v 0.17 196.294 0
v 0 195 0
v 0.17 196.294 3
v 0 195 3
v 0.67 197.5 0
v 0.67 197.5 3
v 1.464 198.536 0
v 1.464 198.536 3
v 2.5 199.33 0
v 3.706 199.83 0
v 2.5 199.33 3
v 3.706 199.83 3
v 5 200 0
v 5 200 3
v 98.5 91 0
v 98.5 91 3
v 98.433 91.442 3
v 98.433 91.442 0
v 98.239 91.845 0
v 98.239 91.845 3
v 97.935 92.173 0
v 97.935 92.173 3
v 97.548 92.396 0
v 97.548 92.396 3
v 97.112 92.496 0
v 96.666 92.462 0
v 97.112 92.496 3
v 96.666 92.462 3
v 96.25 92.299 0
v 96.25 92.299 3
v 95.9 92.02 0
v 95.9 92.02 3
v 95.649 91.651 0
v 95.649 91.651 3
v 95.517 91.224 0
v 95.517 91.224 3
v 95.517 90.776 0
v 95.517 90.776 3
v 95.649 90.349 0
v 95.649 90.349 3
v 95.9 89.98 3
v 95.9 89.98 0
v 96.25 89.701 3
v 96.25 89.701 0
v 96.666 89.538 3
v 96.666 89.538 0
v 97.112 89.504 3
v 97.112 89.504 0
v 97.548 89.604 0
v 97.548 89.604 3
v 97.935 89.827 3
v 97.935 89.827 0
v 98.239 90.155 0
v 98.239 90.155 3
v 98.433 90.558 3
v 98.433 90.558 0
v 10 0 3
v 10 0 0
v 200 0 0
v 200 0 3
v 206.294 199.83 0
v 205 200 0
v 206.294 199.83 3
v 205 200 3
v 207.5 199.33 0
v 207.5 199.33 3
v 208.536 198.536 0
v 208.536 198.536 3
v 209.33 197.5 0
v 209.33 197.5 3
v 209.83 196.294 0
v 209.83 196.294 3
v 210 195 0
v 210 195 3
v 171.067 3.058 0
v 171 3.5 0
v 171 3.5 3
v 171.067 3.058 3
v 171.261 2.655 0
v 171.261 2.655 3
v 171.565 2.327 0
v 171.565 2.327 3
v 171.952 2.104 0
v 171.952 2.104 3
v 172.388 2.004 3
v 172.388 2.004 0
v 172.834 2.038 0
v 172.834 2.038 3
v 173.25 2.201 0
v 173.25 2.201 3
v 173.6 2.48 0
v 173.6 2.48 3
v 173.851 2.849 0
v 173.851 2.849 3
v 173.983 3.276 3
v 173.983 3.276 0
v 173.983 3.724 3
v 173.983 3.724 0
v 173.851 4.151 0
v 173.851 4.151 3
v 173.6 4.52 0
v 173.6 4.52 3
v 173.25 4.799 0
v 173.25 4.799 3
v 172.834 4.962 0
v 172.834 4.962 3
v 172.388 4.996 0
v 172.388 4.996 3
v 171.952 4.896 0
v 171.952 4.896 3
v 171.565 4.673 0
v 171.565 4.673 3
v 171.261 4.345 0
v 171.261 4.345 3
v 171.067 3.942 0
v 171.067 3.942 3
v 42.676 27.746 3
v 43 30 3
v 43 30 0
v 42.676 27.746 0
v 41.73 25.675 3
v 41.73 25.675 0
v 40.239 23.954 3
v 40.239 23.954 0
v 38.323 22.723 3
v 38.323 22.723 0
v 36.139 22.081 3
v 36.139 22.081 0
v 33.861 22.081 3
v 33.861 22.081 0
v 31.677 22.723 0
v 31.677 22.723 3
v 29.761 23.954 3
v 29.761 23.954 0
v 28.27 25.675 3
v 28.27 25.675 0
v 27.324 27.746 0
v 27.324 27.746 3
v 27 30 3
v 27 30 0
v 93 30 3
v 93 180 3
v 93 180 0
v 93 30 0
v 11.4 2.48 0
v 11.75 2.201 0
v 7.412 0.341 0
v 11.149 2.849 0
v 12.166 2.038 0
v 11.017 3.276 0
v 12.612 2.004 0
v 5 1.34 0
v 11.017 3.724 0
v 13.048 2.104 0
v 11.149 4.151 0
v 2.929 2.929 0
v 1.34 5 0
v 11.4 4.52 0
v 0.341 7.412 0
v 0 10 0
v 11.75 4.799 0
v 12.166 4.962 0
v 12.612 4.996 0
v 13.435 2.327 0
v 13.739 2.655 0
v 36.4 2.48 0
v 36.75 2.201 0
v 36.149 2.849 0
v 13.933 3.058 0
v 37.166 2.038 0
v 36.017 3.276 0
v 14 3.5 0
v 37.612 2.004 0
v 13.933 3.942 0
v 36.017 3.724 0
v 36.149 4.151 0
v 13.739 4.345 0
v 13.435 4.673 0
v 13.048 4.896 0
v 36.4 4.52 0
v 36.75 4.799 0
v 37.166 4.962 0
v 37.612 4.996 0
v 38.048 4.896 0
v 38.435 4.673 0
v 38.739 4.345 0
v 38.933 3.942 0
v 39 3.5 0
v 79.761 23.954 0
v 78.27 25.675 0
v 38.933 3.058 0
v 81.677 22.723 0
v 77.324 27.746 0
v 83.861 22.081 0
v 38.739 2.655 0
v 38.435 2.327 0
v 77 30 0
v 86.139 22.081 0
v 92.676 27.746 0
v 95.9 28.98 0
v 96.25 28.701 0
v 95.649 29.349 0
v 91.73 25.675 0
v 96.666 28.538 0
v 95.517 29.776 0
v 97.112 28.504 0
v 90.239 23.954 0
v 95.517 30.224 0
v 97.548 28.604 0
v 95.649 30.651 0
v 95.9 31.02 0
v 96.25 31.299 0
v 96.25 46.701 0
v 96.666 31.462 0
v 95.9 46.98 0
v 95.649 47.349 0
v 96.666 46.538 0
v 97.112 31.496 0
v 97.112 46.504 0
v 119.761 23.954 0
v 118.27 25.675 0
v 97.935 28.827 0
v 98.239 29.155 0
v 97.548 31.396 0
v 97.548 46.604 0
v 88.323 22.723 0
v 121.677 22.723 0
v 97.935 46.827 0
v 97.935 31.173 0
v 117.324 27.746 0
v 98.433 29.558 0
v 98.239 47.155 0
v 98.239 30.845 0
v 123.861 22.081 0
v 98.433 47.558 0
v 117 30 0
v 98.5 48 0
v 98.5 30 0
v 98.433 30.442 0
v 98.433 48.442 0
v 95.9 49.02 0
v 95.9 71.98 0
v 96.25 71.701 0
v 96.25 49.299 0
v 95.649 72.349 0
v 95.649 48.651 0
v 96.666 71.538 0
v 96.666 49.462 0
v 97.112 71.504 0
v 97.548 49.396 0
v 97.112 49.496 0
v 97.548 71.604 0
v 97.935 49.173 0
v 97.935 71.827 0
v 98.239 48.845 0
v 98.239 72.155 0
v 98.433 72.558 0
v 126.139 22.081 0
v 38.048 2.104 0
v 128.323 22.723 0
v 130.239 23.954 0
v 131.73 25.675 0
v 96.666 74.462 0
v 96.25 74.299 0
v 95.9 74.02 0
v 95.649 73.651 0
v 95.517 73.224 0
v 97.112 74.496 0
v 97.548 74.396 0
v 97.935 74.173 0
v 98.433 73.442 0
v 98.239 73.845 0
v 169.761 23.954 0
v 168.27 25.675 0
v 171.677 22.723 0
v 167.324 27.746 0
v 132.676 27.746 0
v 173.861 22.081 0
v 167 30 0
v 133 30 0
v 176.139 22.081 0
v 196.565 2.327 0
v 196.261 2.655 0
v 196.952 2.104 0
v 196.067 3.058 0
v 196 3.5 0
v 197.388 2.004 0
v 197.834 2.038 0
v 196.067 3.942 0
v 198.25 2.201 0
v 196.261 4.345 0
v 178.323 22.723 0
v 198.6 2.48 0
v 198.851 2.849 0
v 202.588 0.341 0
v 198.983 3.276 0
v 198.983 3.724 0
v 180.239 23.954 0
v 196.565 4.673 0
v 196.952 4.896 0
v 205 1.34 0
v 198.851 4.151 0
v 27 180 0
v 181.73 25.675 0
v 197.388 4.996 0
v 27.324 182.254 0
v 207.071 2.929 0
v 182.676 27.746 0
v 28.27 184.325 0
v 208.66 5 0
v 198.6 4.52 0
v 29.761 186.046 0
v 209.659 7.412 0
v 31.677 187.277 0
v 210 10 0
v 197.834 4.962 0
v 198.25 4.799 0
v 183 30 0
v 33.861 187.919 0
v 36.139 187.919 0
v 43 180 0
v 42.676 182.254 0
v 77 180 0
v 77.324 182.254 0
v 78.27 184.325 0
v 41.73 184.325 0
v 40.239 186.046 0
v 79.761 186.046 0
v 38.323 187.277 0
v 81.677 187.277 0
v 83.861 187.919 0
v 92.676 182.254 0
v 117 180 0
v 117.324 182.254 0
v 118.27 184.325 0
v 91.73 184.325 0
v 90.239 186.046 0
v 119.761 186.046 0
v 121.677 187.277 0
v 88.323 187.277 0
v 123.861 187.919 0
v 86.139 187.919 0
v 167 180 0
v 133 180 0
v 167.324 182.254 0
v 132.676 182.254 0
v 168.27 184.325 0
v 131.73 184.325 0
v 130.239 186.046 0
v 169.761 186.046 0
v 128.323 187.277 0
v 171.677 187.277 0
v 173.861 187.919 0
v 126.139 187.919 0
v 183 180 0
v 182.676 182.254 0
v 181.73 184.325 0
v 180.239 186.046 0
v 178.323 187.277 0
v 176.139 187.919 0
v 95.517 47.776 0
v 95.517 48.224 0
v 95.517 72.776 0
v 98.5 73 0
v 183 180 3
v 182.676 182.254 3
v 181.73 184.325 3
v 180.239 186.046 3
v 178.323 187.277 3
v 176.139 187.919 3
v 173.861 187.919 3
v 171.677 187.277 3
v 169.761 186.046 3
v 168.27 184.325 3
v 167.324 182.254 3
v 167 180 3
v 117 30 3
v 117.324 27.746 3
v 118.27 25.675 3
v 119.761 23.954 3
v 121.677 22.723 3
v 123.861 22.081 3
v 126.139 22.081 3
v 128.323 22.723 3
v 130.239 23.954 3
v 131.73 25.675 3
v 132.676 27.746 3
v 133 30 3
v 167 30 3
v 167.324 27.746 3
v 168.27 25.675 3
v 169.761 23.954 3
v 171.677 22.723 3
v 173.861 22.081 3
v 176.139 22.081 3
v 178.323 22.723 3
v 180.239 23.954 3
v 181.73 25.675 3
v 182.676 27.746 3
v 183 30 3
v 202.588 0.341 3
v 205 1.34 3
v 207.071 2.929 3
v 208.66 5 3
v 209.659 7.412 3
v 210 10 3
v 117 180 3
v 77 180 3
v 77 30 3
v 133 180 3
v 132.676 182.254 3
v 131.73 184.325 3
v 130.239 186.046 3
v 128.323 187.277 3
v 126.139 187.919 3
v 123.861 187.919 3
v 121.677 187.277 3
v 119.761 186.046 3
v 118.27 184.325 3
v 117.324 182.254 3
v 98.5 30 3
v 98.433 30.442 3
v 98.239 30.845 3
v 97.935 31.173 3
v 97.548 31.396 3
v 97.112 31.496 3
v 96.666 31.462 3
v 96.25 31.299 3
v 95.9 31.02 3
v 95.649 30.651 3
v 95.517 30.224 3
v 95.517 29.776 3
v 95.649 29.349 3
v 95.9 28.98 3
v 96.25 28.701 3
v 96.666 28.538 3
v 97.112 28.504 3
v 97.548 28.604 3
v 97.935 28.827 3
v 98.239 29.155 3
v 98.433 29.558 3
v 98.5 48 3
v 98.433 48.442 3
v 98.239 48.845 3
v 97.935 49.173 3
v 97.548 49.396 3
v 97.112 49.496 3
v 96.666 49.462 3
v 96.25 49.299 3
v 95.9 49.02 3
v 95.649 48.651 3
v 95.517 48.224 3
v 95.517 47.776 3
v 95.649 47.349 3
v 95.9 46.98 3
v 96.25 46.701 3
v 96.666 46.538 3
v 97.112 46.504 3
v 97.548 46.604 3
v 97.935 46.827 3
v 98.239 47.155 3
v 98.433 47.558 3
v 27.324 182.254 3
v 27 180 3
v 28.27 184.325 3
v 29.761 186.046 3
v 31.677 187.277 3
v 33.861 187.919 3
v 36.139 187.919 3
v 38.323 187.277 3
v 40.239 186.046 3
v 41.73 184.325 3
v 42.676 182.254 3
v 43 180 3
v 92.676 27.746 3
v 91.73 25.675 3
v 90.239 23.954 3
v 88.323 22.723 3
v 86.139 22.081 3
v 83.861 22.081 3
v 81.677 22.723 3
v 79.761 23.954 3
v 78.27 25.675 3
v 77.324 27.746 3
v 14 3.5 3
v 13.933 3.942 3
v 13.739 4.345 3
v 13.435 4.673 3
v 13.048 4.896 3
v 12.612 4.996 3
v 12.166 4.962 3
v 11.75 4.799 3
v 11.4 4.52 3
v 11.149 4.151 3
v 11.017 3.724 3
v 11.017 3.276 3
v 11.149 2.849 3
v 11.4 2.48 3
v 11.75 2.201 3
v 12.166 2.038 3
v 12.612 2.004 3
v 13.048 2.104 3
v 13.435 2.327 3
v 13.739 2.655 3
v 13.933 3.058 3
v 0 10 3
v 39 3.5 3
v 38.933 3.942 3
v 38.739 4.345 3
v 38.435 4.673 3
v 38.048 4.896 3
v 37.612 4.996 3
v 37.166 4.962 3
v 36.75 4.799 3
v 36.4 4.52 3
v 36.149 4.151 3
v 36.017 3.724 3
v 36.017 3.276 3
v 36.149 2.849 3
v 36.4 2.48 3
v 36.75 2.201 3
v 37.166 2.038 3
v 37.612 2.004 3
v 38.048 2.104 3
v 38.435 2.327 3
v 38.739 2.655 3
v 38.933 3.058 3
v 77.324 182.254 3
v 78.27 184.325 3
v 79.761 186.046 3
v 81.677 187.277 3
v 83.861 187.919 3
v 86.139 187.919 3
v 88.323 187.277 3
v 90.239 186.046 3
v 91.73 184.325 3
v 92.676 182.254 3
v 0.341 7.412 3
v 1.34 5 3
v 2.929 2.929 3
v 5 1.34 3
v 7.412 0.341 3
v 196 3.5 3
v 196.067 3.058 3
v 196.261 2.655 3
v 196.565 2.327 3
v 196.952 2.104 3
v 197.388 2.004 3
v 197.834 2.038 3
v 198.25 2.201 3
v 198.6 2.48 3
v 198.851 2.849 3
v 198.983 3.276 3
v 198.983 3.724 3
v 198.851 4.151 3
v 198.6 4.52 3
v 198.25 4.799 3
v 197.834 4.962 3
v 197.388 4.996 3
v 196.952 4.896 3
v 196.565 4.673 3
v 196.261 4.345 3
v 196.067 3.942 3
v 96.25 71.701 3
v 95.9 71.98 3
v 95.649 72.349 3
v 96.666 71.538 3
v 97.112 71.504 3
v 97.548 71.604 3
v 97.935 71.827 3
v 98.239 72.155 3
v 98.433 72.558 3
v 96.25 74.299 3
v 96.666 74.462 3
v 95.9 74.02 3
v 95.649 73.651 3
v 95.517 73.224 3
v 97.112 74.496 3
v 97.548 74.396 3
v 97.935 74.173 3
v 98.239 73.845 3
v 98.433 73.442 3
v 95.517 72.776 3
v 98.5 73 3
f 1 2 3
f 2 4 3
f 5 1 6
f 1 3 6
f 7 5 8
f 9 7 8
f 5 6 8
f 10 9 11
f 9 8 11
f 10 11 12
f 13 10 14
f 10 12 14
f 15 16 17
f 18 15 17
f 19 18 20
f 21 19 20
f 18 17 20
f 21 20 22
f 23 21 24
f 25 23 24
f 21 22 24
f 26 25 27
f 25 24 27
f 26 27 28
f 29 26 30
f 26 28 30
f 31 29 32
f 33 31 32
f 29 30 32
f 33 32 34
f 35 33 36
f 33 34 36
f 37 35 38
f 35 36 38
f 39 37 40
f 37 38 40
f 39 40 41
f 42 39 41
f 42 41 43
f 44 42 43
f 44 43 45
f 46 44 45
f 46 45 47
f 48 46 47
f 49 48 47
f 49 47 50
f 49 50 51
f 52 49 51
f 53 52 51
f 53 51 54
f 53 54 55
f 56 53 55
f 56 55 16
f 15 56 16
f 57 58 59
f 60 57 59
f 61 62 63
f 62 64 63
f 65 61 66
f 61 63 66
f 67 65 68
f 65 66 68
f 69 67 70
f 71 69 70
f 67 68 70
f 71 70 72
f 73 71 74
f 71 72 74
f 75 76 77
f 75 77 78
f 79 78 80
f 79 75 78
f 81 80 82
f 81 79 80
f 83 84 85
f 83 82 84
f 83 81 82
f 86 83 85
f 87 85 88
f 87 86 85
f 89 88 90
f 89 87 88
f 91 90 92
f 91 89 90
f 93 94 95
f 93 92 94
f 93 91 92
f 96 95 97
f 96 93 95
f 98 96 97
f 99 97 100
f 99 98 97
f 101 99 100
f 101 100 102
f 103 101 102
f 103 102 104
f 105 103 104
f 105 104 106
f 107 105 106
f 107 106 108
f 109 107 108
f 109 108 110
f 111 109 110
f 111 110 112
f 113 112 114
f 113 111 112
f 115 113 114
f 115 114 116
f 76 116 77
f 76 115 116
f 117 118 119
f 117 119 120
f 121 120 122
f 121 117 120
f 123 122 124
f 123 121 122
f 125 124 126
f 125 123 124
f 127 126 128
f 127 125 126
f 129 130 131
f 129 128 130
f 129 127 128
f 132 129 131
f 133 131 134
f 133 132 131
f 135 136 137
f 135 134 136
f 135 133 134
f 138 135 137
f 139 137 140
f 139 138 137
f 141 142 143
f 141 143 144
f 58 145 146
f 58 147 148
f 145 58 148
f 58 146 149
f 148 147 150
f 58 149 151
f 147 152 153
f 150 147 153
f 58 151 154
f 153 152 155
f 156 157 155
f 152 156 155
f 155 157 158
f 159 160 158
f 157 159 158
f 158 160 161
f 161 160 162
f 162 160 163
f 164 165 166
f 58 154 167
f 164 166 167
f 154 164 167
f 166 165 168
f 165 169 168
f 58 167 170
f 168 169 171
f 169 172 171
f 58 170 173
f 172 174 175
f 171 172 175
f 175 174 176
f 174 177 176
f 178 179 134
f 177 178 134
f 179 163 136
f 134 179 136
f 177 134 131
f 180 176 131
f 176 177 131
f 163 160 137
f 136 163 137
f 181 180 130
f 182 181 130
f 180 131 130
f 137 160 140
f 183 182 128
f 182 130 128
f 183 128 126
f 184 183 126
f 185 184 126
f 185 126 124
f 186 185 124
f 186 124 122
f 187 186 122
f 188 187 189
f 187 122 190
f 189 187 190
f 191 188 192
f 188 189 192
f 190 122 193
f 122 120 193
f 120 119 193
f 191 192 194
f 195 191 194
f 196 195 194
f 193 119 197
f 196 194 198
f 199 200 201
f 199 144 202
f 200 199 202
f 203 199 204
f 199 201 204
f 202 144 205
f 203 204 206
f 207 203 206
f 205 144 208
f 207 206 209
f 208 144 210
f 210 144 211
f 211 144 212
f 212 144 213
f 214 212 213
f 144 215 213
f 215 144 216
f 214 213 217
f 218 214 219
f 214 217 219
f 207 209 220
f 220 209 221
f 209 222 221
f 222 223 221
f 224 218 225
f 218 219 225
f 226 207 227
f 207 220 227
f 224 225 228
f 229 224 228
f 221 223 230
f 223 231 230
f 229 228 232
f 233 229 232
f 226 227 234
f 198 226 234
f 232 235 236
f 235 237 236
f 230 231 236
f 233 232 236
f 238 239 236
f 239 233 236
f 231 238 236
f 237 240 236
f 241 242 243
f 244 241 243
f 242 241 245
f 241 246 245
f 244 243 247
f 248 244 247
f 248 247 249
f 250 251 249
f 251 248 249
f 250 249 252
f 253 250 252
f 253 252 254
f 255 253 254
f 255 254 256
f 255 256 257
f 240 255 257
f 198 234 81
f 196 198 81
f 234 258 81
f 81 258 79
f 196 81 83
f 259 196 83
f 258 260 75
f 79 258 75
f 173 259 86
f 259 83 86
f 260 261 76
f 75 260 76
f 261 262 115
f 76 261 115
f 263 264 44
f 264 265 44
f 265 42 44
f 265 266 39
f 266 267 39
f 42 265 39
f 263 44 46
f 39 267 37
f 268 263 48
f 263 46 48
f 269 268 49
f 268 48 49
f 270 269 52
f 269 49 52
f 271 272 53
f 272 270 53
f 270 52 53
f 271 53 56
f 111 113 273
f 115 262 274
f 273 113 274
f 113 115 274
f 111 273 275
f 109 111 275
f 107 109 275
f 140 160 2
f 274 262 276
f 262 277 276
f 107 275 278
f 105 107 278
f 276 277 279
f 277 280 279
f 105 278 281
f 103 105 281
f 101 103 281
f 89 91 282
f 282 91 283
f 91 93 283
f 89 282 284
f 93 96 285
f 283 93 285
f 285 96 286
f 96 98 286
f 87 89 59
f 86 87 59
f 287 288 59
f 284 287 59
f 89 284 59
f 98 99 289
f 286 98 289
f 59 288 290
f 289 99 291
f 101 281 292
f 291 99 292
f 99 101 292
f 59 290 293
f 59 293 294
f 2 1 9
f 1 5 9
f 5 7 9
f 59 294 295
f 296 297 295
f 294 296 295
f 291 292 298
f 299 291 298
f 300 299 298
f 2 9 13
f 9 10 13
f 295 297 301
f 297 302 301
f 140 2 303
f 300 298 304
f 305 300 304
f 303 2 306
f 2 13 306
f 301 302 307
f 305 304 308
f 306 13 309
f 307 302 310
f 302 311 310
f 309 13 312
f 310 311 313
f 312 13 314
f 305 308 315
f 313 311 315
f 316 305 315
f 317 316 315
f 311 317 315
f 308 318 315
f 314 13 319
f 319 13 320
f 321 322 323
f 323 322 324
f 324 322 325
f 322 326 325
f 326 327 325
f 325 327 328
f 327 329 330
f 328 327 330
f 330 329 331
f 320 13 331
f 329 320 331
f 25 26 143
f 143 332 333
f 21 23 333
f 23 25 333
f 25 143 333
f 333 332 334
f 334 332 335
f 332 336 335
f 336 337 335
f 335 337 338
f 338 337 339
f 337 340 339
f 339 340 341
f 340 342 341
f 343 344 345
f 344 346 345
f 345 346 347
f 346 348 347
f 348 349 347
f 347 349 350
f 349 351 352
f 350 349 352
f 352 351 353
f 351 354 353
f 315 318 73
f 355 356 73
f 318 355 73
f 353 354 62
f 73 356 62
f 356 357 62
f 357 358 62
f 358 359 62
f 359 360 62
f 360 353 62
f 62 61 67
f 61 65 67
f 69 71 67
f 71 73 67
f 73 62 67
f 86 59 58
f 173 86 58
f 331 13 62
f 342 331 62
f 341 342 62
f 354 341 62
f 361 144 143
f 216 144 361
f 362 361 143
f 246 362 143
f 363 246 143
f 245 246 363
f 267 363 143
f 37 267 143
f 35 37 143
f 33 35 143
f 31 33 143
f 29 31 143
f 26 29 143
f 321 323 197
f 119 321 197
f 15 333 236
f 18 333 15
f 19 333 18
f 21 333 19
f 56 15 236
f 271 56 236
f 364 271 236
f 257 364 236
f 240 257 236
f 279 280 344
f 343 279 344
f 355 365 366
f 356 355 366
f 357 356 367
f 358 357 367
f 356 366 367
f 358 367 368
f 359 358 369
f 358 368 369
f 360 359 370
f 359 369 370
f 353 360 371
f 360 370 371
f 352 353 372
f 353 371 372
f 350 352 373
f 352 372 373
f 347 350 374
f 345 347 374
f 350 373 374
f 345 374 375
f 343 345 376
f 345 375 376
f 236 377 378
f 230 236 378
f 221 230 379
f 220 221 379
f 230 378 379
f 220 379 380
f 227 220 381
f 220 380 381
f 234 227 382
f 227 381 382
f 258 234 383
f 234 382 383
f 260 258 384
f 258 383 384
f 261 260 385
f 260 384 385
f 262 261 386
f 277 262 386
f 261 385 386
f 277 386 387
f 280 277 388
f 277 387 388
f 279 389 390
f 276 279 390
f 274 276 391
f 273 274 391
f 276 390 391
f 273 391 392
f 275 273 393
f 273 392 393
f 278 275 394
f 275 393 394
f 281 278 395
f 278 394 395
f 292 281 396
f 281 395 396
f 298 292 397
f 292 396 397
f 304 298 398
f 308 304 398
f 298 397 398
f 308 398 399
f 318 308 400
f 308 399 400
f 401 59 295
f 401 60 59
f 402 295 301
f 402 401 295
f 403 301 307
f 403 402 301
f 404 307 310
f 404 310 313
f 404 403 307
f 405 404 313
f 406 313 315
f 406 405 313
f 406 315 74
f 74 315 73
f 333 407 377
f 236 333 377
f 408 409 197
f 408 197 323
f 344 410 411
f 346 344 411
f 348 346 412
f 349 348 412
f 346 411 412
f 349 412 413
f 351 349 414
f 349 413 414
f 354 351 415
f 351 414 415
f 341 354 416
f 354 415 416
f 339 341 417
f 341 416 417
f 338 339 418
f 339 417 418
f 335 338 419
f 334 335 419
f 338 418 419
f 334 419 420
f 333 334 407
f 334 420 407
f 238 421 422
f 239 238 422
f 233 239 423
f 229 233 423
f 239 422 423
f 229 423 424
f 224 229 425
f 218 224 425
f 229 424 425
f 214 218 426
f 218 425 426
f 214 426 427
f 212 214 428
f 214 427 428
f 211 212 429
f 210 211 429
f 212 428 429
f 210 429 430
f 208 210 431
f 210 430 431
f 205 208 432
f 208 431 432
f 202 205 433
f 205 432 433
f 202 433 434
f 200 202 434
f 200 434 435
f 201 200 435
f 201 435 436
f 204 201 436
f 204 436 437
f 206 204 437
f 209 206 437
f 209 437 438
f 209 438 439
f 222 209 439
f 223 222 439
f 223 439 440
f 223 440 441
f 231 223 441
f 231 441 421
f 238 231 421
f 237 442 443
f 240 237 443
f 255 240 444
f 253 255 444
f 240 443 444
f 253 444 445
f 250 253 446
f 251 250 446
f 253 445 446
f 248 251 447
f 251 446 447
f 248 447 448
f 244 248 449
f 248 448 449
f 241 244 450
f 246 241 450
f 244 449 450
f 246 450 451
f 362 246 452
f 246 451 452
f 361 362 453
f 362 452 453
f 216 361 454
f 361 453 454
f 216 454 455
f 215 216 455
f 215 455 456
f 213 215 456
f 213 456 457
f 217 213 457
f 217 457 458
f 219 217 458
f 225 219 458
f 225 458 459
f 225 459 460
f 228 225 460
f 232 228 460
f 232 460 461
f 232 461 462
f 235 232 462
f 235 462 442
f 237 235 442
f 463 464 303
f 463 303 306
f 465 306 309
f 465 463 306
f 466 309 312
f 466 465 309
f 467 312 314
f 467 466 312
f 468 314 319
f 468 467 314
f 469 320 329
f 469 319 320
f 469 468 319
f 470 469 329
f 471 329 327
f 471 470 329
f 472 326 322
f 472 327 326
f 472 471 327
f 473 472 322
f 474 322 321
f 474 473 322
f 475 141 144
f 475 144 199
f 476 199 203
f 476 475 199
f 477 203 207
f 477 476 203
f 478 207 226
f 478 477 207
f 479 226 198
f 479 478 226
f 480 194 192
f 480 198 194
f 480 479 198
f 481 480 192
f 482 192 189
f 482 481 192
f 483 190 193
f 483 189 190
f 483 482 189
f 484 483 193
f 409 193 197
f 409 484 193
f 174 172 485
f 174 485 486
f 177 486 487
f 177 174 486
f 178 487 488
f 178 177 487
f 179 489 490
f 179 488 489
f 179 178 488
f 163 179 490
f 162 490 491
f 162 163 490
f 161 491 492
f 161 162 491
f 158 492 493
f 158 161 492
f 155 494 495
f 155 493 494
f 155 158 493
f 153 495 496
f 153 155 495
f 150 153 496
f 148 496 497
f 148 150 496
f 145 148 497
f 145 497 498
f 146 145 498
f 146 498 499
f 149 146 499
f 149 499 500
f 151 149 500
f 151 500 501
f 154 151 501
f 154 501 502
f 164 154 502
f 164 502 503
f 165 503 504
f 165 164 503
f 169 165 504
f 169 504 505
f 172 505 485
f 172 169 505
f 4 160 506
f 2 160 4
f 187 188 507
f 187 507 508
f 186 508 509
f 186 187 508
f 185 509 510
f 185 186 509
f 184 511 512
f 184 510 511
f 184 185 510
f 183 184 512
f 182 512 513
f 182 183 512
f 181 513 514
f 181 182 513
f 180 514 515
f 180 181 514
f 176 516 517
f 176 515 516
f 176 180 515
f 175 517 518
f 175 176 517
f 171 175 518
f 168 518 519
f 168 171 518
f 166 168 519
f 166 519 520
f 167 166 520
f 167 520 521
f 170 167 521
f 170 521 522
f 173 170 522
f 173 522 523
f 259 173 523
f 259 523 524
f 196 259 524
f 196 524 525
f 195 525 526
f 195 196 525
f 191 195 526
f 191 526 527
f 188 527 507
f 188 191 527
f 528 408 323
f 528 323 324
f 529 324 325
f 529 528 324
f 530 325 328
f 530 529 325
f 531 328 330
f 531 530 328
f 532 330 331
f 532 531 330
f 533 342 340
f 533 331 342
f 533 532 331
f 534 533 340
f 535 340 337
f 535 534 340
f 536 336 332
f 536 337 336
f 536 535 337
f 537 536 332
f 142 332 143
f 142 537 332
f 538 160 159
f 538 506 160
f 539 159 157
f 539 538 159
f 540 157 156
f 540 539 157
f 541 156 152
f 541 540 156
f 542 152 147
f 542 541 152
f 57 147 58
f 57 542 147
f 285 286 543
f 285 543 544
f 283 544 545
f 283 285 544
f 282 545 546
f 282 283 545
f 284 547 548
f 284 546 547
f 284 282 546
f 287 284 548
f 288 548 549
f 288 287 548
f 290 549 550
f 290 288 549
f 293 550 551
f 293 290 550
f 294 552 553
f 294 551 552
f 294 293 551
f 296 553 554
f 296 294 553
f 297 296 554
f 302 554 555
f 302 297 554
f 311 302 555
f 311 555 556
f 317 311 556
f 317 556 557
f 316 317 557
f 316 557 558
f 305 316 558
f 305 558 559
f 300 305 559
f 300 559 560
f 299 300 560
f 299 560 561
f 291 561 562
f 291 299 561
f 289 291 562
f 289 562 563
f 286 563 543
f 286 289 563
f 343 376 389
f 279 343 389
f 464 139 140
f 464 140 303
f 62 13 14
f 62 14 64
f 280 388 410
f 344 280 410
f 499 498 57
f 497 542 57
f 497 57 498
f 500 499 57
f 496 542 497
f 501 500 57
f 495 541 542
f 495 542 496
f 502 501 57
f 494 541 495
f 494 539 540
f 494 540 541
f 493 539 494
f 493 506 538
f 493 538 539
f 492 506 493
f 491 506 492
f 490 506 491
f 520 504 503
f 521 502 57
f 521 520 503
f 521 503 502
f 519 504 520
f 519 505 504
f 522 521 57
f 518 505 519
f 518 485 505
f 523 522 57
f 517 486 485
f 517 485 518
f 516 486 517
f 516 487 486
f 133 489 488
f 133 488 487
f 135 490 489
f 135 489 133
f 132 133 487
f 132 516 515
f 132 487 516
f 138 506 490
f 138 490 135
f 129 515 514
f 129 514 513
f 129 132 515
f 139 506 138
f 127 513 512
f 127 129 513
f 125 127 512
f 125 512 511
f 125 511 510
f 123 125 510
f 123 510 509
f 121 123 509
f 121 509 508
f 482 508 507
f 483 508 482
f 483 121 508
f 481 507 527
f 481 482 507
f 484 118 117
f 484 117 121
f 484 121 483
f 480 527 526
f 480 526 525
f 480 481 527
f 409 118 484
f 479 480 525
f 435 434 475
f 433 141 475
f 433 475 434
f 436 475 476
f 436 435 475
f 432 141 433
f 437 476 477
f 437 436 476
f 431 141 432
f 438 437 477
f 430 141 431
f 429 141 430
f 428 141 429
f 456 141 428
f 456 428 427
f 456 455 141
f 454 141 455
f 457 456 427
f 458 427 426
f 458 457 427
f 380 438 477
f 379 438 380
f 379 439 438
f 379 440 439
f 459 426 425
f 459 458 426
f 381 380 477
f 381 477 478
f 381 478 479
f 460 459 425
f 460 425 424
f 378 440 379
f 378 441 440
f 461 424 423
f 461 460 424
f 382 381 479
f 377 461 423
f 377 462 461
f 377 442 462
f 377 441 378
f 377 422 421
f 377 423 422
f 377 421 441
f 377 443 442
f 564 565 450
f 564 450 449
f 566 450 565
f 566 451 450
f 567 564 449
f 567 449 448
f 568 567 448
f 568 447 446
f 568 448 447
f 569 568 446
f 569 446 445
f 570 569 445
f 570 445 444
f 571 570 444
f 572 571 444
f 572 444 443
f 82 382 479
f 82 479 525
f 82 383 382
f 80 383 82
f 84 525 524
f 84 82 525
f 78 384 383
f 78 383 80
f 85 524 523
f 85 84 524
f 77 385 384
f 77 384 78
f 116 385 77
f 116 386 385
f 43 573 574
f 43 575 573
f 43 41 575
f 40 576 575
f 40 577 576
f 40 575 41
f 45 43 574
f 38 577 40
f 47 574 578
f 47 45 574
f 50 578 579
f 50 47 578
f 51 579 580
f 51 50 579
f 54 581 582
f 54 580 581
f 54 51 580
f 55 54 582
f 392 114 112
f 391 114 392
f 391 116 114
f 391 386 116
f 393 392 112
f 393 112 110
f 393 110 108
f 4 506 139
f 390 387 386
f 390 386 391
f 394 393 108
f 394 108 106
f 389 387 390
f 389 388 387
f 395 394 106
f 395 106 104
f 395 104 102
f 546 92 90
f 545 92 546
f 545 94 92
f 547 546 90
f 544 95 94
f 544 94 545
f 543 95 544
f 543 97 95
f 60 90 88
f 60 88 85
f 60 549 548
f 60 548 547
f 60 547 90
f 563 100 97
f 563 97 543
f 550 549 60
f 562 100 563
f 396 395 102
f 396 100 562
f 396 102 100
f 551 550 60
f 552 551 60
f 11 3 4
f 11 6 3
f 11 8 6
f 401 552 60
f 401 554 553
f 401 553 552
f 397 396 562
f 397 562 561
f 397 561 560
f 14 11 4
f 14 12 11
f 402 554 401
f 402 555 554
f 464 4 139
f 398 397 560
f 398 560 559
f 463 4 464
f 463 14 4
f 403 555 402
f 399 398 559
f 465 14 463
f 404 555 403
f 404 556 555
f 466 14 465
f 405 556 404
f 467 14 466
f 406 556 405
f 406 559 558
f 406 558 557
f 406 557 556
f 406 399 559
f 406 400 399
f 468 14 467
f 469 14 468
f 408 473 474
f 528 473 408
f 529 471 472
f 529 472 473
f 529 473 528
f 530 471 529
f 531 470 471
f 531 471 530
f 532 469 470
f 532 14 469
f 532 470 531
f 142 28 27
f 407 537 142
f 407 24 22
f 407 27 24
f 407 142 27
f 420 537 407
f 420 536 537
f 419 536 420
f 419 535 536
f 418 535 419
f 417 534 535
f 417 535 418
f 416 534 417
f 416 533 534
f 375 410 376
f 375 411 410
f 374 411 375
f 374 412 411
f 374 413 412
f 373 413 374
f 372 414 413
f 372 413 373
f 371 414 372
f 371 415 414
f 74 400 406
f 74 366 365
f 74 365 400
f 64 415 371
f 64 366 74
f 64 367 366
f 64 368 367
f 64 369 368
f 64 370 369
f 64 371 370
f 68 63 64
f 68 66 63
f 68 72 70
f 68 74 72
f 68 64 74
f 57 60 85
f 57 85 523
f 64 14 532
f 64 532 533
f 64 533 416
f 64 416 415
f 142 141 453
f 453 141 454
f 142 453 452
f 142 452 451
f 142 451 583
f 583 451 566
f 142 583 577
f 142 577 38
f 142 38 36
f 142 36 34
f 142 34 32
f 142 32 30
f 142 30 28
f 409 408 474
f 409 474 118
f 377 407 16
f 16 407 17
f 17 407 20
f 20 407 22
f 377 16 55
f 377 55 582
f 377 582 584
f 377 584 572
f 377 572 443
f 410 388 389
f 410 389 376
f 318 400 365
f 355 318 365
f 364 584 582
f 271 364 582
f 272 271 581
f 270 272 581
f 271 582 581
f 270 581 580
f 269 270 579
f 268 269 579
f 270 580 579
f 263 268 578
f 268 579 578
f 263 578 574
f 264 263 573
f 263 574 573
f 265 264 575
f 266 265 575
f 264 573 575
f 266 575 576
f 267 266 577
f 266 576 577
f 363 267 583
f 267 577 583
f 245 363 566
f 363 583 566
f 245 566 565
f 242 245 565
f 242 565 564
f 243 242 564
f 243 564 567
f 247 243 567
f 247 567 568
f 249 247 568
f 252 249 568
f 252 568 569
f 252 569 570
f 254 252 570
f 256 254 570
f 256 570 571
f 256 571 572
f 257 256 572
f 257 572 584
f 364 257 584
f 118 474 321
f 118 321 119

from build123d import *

# Parameters (mm, degrees)
SKETCH_1_W               = 210
SKETCH_1_H               = 200
EXTRUDE_1_DEPTH          = 3
CUT_EXTRUDE_1_DEPTH      = 291.015516826
FILLET_2_R               = 10
FILLET_3_R               = 5
CUT_EXTRUDE_2_DEPTH      = 291.015516826
CUT_EXTRUDE_2_DEPTH_BACK = 291.015516826
SKETCH_4_R               = 1.5
SKETCH_5_R               = 1.5
CUT_EXTRUDE_3_DEPTH      = 291.015516826


with BuildPart() as part:
    # 草图1 → 凸台-拉伸1 (new body)
    with BuildSketch(Plane.XY):
        with Locations((105, 100)):
            Rectangle(SKETCH_1_W, SKETCH_1_H)
    extrude(amount=EXTRUDE_1_DEPTH)

    # 草图2 → 切除-拉伸1 (cut, through all)
    with BuildSketch(Plane.XY.offset(3)):
        with BuildLine():
            Line((43, 180), (43, 30))
            ThreePointArc((43, 30), (35, 22), (27, 30))
            Line((27, 30), (27, 180))
            ThreePointArc((27, 180), (35, 188), (43, 180))
        make_face()
        with BuildLine():
            Line((167, 180), (167, 30))
            ThreePointArc((167, 30), (175, 22), (183, 30))
            Line((183, 30), (183, 180))
            ThreePointArc((183, 180), (175, 188), (167, 180))
        make_face()
        with BuildLine():
            Line((93, 180), (93, 30))
            ThreePointArc((93, 30), (85, 22), (77, 30))
            Line((77, 30), (77, 180))
            ThreePointArc((77, 180), (85, 188), (93, 180))
        make_face()
        with BuildLine():
            Line((117, 180), (117, 30))
            ThreePointArc((117, 30), (125, 22), (133, 30))
            Line((133, 30), (133, 180))
            ThreePointArc((133, 180), (125, 188), (117, 180))
        make_face()
    extrude(amount=-CUT_EXTRUDE_1_DEPTH, mode=Mode.SUBTRACT)

    # 圆角2
    fillet_2_edges = [part.edges().sort_by_distance(p)[0] for p in [
        (210, 0, 1.5),
        (0, 0, 1.5),
    ]]
    fillet(fillet_2_edges, radius=FILLET_2_R)

    # 圆角3
    fillet_3_edges = [part.edges().sort_by_distance(p)[0] for p in [
        (0, 200, 1.5),
        (210, 200, 1.5),
    ]]
    fillet(fillet_3_edges, radius=FILLET_3_R)

    # 草图4 → 切除-拉伸2 (cut, two sides: drawn at the far end of the back side and taken through both)
    with BuildSketch(Plane.XY.offset(3).offset(-CUT_EXTRUDE_2_DEPTH_BACK)):
        with Locations((12.5, 3.5)):
            Circle(SKETCH_4_R)
        with Locations((37.5, 3.5)):
            Circle(SKETCH_4_R)
        with Locations(Location((172.5, 3.5, 0), (0, 0, 180))):
            Circle(SKETCH_4_R)
        with Locations(Location((197.5, 3.5, 0), (0, 0, 180))):
            Circle(SKETCH_4_R)
    extrude(amount=CUT_EXTRUDE_2_DEPTH + CUT_EXTRUDE_2_DEPTH_BACK, mode=Mode.SUBTRACT)

    # 草图5 → 切除-拉伸3 (cut, through all)
    with BuildSketch(Plane.XY.offset(3)):
        with Locations((97, 48)):
            Circle(SKETCH_5_R)
        with Locations((97, 30)):
            Circle(SKETCH_5_R)
        with Locations((97, 73)):
            Circle(SKETCH_5_R)
        with Locations((97, 91)):
            Circle(SKETCH_5_R)
    extrude(amount=-CUT_EXTRUDE_3_DEPTH, mode=Mode.SUBTRACT)


solid = part.part
